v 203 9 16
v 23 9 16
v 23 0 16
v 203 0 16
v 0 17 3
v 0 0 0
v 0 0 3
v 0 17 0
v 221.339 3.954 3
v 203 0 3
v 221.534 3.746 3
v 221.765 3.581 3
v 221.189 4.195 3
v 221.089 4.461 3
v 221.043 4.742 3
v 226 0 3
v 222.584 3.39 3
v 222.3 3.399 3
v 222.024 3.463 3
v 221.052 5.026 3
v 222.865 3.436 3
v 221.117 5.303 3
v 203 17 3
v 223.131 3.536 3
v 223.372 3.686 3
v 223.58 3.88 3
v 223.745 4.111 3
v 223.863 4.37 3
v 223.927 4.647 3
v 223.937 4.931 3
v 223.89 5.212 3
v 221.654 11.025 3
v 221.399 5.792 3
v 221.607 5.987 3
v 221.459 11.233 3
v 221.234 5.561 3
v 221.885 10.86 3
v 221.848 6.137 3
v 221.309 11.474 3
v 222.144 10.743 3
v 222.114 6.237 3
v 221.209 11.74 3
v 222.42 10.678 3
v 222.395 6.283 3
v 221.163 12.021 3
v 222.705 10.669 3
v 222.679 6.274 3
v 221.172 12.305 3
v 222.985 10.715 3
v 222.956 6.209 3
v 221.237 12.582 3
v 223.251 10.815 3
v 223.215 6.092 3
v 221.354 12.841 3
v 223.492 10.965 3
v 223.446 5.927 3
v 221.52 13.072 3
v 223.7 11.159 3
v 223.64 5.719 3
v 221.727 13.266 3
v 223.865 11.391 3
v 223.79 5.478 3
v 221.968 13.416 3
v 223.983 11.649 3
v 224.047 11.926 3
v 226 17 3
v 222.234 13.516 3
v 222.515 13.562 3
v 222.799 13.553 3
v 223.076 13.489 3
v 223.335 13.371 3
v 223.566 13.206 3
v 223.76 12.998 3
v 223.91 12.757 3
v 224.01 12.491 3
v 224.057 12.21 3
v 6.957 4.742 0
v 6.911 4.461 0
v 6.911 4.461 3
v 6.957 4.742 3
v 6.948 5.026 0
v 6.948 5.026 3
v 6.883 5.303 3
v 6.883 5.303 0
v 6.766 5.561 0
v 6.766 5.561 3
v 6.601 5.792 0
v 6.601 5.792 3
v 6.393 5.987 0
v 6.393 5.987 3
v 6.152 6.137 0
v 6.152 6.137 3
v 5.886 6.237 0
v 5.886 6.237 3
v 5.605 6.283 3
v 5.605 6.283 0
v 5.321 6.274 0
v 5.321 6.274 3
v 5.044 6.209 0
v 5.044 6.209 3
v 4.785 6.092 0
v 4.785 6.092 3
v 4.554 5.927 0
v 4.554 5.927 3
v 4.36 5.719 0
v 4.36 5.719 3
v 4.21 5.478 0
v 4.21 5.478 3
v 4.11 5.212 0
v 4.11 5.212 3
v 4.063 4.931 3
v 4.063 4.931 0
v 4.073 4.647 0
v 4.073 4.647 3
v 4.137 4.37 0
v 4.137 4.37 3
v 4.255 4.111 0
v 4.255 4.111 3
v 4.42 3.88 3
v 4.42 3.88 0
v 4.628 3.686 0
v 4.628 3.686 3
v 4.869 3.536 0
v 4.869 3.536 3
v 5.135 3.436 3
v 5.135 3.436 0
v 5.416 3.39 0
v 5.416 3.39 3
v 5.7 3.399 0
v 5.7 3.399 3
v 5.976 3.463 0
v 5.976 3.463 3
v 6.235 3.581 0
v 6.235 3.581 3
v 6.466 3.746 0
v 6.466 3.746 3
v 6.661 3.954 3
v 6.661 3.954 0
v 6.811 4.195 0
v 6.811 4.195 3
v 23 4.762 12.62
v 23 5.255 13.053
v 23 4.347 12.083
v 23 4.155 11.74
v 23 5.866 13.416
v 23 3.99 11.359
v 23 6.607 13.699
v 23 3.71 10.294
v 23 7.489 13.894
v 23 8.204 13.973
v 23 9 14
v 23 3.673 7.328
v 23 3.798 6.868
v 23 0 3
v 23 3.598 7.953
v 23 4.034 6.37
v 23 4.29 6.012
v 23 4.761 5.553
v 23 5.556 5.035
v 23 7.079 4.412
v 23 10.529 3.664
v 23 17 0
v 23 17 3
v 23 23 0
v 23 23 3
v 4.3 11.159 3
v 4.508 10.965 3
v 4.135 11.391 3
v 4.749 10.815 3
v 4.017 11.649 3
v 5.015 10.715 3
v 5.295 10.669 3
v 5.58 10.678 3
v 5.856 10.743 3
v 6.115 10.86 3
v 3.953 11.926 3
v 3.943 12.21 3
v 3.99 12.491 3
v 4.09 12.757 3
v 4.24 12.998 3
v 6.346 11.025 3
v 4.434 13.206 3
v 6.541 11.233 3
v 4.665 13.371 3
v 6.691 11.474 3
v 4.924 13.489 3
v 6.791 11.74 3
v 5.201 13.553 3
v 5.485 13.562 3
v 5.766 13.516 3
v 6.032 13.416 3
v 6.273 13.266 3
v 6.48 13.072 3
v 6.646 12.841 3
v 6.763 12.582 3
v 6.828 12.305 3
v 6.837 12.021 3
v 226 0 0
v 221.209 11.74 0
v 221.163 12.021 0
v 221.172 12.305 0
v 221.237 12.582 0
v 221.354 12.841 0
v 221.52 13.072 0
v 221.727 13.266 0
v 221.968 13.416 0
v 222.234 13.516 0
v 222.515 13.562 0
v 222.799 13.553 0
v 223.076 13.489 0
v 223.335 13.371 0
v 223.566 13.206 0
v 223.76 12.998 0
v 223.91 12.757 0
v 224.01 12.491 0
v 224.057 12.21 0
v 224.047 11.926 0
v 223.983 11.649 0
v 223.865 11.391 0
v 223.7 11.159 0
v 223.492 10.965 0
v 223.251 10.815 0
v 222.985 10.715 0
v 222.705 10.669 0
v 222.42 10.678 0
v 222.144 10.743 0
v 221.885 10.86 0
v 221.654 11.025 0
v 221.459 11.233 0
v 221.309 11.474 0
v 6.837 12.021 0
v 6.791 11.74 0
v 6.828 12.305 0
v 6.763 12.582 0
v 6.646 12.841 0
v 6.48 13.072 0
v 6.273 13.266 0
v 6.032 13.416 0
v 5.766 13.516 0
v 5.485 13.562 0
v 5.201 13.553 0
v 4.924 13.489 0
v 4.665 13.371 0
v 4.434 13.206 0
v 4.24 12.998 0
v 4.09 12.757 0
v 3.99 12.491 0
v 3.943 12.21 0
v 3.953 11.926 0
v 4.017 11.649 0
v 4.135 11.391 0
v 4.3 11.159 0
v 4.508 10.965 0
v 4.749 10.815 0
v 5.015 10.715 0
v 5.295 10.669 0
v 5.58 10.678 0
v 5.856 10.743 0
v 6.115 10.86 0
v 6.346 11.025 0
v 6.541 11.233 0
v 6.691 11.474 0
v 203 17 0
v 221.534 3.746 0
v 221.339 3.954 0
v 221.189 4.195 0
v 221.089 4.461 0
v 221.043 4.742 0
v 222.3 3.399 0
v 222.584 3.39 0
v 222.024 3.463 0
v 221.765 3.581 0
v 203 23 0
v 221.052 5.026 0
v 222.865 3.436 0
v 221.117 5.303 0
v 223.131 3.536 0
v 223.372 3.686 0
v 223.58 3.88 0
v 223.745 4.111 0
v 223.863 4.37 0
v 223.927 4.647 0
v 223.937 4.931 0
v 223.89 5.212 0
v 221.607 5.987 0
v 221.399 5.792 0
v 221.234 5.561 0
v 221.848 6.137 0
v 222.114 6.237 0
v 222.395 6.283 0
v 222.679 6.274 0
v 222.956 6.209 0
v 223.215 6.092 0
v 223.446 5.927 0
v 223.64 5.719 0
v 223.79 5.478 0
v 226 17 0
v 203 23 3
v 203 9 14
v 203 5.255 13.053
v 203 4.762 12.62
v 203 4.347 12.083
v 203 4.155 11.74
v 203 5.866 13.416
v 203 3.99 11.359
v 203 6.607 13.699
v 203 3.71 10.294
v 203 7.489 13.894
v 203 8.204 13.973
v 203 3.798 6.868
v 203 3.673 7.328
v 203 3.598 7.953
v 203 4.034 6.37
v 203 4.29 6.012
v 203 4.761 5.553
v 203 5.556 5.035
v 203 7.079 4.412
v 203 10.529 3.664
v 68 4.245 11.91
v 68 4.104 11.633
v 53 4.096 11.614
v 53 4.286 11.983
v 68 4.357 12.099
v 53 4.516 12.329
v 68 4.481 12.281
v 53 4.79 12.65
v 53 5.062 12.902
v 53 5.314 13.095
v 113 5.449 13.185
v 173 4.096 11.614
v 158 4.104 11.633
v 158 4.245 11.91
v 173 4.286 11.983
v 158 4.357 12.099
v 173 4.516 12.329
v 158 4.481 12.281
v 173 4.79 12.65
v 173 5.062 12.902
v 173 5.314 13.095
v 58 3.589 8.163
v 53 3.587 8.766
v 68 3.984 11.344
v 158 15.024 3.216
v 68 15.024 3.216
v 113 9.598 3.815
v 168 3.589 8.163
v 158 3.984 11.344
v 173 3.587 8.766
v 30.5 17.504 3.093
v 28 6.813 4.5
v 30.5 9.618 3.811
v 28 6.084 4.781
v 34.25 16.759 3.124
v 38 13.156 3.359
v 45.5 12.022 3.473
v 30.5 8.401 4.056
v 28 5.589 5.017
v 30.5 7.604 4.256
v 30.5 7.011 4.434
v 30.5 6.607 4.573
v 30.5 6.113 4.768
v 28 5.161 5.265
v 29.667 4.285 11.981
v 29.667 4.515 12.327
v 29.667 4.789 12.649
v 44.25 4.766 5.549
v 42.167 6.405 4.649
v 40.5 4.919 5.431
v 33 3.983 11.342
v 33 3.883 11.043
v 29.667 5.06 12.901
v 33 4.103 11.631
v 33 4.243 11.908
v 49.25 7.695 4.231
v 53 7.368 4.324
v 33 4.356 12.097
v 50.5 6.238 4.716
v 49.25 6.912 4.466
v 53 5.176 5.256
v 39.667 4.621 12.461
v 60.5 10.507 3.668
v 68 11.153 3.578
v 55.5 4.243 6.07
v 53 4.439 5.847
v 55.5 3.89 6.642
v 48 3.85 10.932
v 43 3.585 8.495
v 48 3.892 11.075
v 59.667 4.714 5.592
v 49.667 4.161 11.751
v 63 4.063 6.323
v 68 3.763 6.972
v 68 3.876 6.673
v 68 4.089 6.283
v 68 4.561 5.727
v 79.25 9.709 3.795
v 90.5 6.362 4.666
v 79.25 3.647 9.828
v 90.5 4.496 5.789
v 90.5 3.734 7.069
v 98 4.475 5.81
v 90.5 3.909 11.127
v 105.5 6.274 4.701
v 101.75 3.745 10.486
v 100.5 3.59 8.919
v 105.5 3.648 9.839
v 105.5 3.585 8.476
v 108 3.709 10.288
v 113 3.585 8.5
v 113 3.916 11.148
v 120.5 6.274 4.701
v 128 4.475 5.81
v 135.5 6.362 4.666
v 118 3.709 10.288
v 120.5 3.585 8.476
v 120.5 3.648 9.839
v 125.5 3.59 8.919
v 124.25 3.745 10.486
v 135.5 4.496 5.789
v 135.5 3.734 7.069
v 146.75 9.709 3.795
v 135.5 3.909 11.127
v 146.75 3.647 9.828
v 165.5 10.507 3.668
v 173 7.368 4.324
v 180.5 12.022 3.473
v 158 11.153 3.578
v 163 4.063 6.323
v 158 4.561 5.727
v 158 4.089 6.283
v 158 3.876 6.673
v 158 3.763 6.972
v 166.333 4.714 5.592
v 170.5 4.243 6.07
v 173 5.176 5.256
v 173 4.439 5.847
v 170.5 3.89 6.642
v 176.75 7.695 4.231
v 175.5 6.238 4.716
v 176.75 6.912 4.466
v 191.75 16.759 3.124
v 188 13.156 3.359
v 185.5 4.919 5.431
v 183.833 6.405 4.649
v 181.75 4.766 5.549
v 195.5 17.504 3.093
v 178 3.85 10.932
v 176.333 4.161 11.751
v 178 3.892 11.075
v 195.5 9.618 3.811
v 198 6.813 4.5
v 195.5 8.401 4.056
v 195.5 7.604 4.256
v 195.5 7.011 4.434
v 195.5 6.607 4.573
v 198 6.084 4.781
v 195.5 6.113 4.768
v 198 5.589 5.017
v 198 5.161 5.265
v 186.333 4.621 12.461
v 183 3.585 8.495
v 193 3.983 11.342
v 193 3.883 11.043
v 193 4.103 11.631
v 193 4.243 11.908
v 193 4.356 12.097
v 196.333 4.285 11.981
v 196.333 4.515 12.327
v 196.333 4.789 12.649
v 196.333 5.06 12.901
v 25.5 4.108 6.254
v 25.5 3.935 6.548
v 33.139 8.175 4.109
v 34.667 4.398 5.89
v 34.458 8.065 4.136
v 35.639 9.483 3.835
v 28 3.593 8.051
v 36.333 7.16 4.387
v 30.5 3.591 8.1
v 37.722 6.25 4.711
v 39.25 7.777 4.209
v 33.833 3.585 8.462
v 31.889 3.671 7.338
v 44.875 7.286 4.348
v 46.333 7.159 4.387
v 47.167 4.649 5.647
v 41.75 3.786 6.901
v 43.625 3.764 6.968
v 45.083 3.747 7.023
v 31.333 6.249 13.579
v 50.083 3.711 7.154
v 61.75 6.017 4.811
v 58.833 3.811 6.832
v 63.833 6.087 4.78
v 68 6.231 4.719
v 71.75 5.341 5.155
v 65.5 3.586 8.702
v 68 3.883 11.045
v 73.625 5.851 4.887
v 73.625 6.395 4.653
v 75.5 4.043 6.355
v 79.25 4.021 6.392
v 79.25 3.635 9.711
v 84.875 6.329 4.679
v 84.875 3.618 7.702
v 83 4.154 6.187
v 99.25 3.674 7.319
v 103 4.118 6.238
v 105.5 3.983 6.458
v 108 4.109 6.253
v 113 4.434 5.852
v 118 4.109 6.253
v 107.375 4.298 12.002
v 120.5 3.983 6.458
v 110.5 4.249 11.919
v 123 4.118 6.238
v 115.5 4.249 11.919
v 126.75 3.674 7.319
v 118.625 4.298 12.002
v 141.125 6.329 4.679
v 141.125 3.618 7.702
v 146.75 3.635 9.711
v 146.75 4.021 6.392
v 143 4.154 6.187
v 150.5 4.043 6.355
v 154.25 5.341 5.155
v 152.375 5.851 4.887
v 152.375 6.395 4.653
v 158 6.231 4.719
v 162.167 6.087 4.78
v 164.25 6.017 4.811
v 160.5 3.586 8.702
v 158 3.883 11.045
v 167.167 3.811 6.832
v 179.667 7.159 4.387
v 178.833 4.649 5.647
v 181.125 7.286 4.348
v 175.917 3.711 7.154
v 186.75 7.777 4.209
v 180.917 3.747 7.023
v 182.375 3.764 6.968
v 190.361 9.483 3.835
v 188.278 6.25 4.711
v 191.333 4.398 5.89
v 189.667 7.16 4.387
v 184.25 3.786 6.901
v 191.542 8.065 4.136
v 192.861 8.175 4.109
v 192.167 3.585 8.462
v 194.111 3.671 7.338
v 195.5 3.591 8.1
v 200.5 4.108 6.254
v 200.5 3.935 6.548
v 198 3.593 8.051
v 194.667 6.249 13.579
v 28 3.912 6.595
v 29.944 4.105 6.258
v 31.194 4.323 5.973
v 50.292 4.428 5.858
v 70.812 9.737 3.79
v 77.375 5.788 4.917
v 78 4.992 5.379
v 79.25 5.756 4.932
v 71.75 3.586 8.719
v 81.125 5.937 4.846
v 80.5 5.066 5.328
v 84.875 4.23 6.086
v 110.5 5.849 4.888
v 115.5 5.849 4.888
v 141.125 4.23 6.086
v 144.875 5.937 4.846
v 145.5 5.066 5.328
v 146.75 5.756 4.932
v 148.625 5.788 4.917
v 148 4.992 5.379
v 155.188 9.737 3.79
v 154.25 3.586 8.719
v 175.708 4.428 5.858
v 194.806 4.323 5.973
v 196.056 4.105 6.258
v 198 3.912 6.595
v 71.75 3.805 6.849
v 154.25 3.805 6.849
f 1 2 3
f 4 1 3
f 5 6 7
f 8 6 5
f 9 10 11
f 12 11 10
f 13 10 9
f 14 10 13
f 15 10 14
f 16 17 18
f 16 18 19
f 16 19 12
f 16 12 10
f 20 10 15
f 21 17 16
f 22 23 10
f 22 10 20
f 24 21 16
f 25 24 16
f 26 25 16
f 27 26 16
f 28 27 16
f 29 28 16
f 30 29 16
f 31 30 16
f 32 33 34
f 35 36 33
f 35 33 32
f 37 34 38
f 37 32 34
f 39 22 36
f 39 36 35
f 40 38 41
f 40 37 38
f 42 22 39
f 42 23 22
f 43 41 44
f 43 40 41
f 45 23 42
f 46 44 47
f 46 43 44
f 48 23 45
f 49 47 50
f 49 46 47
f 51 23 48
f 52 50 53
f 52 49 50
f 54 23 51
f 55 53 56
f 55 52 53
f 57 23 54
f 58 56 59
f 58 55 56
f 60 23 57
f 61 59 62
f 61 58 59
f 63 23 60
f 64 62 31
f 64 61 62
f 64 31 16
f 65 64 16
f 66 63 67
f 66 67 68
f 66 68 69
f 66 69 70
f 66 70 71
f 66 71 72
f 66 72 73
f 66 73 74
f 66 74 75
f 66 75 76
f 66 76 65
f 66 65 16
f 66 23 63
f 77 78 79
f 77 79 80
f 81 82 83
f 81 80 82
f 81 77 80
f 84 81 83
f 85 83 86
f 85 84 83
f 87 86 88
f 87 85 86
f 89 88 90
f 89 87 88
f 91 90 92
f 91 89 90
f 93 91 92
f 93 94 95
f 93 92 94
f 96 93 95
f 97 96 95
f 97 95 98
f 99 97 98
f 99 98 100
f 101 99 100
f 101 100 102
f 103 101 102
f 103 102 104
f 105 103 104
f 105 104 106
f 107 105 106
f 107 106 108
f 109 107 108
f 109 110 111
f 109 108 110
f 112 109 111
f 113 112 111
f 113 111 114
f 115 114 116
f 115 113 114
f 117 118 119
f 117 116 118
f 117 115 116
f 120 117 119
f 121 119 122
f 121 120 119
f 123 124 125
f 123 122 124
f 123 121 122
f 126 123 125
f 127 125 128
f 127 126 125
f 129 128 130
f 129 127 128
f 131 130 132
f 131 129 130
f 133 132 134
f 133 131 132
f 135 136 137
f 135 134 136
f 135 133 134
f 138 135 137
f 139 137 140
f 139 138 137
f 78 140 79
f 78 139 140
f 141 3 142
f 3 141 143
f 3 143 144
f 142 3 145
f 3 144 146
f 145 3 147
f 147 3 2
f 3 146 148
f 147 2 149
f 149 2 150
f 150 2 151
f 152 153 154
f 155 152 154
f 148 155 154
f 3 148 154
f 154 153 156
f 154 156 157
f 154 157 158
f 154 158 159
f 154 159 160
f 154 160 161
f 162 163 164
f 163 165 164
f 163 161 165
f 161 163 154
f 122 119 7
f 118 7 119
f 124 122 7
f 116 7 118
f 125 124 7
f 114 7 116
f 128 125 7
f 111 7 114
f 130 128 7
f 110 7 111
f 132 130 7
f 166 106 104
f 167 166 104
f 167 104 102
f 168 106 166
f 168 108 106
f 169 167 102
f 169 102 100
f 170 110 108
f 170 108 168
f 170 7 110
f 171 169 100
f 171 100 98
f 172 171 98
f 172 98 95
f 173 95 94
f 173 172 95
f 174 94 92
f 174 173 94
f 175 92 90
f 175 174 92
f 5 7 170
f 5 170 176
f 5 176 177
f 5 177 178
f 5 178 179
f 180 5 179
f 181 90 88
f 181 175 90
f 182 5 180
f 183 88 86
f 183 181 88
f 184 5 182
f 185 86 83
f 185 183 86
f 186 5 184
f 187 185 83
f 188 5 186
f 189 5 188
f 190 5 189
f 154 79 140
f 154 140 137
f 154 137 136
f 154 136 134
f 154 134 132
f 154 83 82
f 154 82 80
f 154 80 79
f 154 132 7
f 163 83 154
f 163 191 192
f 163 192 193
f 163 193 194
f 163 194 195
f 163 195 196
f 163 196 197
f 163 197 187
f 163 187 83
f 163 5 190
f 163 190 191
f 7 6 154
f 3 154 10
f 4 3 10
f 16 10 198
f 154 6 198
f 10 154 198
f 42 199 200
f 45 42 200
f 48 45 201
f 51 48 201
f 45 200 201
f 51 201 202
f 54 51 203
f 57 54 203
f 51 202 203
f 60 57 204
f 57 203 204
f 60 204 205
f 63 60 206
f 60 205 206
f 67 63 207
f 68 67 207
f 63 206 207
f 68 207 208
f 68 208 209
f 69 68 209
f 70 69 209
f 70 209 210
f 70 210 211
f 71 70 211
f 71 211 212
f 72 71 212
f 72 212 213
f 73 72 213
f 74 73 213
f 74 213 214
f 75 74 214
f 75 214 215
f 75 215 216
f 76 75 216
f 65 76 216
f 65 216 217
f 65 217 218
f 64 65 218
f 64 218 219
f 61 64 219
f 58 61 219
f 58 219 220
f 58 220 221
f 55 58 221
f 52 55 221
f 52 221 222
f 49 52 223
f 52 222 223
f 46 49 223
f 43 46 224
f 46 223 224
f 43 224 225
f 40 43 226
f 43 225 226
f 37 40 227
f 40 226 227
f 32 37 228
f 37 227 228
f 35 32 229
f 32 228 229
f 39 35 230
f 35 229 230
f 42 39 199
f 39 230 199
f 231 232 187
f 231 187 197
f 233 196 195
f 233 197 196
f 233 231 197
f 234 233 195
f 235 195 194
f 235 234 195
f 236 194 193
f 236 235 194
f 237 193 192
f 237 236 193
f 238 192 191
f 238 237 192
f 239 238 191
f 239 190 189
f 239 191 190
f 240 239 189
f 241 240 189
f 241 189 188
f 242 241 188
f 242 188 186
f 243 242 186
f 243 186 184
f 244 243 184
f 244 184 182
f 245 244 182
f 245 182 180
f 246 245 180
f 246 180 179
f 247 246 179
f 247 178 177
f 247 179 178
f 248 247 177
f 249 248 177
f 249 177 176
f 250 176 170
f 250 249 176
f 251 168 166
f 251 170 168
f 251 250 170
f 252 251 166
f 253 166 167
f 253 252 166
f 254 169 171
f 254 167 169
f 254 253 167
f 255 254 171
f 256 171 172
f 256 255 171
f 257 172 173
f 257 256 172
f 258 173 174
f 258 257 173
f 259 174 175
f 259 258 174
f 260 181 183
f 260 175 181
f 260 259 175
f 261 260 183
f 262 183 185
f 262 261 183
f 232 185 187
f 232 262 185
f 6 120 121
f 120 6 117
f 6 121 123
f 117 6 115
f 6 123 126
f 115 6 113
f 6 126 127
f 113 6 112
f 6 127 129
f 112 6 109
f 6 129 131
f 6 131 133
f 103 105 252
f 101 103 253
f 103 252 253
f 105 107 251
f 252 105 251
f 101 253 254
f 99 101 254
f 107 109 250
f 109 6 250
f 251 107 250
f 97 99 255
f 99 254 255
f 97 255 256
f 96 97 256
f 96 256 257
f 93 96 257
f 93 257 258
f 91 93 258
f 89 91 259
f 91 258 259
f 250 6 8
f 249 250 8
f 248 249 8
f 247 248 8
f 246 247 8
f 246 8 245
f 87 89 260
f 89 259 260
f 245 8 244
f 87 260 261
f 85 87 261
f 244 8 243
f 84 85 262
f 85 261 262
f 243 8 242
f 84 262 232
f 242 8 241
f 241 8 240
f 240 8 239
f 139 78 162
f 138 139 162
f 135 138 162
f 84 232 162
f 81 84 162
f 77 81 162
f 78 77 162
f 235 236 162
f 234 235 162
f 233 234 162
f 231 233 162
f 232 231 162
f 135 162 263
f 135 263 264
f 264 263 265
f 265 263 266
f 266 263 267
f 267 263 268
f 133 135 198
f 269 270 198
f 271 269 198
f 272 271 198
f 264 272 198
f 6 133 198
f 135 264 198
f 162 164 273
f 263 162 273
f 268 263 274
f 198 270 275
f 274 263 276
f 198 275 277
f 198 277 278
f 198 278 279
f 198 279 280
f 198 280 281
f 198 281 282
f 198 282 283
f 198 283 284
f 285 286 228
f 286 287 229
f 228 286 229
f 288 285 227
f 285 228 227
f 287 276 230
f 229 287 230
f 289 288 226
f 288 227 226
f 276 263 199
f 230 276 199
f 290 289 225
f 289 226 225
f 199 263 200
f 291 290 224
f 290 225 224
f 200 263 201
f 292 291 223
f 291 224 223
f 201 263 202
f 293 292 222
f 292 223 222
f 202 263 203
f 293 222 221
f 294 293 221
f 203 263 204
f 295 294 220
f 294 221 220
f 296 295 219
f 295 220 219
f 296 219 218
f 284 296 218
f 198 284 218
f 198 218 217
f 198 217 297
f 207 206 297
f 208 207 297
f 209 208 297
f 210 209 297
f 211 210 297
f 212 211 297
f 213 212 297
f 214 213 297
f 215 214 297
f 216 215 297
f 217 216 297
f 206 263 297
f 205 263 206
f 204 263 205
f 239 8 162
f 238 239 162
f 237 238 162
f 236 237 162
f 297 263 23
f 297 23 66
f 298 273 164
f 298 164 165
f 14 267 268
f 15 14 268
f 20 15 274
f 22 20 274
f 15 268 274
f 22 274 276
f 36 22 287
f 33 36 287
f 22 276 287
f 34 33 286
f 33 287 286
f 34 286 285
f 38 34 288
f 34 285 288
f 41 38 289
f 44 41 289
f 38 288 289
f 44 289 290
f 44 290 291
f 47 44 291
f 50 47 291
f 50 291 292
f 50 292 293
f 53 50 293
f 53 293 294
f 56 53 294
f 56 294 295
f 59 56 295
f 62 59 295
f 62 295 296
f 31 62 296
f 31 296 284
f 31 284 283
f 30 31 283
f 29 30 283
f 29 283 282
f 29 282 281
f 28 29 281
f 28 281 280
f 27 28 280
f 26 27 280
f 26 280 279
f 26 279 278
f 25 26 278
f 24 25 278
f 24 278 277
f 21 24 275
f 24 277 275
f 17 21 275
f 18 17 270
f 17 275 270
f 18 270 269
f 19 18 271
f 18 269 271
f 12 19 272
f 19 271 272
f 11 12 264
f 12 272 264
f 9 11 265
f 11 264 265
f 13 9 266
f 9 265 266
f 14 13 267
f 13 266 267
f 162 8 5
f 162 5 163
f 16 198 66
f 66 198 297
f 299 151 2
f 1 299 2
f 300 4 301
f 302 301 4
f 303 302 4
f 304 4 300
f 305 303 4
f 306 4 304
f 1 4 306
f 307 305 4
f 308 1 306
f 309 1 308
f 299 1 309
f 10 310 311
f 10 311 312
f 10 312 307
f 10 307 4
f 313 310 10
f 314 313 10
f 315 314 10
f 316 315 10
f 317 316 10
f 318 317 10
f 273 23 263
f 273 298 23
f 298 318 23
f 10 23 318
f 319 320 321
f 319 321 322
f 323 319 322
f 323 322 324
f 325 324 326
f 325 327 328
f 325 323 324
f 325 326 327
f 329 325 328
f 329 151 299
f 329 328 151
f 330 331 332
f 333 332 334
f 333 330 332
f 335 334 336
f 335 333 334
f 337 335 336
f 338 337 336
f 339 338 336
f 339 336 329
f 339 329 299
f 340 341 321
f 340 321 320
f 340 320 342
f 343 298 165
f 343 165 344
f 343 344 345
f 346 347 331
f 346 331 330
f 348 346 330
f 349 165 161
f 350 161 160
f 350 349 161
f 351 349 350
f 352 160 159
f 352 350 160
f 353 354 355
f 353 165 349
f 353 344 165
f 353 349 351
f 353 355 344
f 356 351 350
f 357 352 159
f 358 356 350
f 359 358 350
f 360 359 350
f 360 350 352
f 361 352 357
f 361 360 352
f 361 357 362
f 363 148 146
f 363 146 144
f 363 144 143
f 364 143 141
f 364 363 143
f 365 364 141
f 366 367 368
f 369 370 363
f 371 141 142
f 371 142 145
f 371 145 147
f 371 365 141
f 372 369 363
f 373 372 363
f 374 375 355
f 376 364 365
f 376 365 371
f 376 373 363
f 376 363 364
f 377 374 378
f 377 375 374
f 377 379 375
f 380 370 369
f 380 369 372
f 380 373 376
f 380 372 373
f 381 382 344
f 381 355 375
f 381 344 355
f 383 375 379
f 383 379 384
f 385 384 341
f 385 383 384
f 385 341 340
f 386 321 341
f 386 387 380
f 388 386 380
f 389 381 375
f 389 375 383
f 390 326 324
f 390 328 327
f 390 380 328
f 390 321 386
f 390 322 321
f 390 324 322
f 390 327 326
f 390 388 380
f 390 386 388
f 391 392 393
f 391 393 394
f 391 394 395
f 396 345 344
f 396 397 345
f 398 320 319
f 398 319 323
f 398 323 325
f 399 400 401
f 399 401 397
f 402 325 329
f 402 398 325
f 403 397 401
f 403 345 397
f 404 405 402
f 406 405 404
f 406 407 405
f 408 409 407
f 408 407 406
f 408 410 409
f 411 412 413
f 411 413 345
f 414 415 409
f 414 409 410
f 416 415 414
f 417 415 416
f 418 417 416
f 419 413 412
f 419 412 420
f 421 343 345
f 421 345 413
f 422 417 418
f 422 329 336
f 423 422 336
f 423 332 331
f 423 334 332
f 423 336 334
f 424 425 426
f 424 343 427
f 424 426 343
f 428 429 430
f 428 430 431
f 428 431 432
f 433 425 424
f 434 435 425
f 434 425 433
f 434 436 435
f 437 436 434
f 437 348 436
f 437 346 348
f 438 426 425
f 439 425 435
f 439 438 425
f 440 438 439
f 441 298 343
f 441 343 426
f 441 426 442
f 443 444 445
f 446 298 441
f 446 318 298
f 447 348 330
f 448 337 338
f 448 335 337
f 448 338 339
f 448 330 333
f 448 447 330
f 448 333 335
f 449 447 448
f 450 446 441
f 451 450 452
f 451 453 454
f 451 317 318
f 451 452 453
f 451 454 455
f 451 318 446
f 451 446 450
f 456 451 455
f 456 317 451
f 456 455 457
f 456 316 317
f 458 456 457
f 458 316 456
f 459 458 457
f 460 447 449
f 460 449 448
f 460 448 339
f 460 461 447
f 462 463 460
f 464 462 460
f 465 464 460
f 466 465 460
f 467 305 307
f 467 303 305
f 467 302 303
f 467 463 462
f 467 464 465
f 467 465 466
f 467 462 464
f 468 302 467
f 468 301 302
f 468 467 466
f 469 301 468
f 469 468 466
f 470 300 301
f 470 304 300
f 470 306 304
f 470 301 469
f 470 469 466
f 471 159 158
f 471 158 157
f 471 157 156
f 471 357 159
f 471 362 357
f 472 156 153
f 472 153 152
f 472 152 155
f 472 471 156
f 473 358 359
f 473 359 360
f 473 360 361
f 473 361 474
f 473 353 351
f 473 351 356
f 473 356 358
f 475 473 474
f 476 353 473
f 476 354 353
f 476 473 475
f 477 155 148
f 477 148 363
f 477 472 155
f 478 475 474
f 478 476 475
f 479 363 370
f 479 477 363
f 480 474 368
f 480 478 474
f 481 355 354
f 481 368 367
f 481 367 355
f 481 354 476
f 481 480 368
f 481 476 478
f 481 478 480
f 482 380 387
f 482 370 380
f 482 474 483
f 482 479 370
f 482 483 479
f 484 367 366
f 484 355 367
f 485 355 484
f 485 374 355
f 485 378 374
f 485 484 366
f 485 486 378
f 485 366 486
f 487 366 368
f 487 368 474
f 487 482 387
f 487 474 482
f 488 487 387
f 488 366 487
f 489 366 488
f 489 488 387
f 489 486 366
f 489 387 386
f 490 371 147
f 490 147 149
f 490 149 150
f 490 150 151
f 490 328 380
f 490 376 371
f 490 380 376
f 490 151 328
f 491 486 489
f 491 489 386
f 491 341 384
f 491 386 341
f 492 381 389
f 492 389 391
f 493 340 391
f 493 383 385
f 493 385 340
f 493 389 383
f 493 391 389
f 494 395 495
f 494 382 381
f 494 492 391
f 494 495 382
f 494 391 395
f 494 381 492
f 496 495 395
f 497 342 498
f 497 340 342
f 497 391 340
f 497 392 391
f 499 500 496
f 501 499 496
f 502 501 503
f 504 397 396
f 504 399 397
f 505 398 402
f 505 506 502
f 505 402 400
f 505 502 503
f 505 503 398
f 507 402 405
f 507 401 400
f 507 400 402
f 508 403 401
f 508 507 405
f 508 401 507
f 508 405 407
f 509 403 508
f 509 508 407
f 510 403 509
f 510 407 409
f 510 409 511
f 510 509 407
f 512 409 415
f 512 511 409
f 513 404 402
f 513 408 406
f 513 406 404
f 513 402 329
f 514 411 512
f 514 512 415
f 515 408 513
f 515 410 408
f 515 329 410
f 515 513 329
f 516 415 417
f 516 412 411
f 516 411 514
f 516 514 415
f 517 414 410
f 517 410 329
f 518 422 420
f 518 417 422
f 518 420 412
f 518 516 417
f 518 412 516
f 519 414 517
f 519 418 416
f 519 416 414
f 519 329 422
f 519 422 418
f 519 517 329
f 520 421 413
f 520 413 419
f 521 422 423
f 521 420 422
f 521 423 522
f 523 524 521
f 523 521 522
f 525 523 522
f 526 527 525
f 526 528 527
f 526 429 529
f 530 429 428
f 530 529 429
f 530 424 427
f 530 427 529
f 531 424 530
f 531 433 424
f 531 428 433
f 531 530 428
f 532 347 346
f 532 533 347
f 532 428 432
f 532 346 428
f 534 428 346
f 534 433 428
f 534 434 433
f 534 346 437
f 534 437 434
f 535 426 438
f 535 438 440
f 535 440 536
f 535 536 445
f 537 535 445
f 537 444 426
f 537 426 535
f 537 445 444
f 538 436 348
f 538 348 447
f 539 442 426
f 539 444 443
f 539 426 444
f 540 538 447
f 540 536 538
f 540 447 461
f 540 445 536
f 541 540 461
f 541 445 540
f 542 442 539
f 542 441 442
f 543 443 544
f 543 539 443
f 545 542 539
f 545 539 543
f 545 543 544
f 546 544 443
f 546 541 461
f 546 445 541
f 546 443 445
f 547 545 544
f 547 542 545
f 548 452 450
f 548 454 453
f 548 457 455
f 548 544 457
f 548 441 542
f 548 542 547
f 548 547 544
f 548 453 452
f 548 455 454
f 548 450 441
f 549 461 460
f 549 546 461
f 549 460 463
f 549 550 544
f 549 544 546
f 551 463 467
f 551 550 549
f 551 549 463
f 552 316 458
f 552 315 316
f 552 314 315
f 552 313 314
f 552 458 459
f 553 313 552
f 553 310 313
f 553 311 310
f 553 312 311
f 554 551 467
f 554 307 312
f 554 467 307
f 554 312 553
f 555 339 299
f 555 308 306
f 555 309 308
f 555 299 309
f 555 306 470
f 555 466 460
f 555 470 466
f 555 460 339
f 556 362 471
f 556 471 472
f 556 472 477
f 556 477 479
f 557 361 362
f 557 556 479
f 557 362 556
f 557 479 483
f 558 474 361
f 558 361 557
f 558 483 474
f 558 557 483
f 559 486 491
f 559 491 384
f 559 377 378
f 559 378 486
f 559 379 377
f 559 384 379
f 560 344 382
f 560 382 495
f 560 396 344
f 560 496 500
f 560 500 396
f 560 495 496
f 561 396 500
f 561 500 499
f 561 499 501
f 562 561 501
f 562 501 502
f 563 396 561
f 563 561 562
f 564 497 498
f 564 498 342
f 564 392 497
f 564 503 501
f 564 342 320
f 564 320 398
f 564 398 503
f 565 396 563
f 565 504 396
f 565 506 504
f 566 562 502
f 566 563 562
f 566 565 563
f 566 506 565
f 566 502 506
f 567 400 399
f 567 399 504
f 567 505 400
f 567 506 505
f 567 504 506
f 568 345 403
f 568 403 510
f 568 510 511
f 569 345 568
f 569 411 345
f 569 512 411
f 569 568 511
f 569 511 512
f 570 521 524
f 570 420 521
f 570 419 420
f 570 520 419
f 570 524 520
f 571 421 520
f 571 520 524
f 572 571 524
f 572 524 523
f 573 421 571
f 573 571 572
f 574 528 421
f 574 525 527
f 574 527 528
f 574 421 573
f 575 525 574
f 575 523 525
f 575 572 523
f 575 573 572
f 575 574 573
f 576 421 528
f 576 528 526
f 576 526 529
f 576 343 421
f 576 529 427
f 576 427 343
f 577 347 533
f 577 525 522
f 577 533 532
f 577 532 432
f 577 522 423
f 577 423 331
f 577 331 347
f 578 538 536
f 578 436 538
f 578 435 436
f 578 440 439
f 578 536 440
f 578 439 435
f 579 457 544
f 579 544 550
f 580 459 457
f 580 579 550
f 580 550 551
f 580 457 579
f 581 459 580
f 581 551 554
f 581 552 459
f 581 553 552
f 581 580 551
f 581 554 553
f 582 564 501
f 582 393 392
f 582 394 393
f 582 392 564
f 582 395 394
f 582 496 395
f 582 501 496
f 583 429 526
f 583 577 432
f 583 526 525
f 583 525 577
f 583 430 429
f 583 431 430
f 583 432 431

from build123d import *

# Parameters (mm, degrees)
CYLINDER006_R           = 1.45
CYLINDER006_DEPTH       = 50
CYLINDER007_R           = 1.45
CYLINDER007_DEPTH       = 50
BODY007_PLACEMENT_ANGLE = 15
BOX_W                   = 226
BOX_H                   = 17
BOX_DEPTH               = 3
PAD005_DEPTH            = 180
BODY011_PITCH_ANGLE     = -90
BODY011_PLACEMENT_ANGLE = -90


with BuildPart() as cylinder004:
    # Cylinder006 → Cylinder006 (new body)
    with BuildSketch(Plane(origin=(23, 5, -5), x_dir=(1, 0, 0), z_dir=(0, 0, 1))):
        Circle(CYLINDER006_R)
    extrude(amount=CYLINDER006_DEPTH)


with BuildPart() as round_holes_clone:
    # Cylinder007 → Cylinder007 (new body)
    with BuildSketch(Plane(origin=(21, 12, -5), x_dir=(1, 0, 0), z_dir=(0, 0, 1))):
        Circle(CYLINDER007_R)
    extrude(amount=CYLINDER007_DEPTH)

    # Fusion: union Cylinder004
    add(cylinder004.part)


with BuildPart() as round_holes_clone_1:
    # Body007 placement: moved
    add(round_holes_clone.part.moved(Location((0, 5.95964, -31))).rotate(Axis((0, 5.95964, -31), (0, 0, -1)), BODY007_PLACEMENT_ANGLE))


with BuildPart() as fusion003:
    # Part__Mirroring001: instance of round holes clone
    add(round_holes_clone_1.part.mirror(Plane(origin=(132, 0, 0), x_dir=(0, -1, 0), z_dir=(1, 0, 0))))

    # Fusion003: union round holes clone
    add(round_holes_clone_1.part)


with BuildPart() as fusion003_1:
    # Fusion003 placement: moved
    add(fusion003.part.moved(Location((-18, 0, 0))))


with BuildPart() as body009:
    # Box → Box (new body)
    with BuildSketch(Plane.XY):
        with Locations((113, 8.5)):
            Rectangle(BOX_W, BOX_H)
    extrude(amount=BOX_DEPTH)

    # Cut003: cut Fusion003
    add(fusion003_1.part, mode=Mode.SUBTRACT)


with BuildPart() as fusion004:
    # Sketch005 → Pad005 (new body)
    with BuildSketch(Plane.XZ):
        with BuildLine():
            Line((-8.5, -3), (-8.5, 20))
            Line((-8.5, 20), (-5.5, 20))
            add(Edge.make_bspline(
                [(-5.5, 20), (-5.5, 1.17), (0, 0), (5.5, 1.17), (5.5, 6)],
                knots=[0, 0, 0, 0, 0.5, 1, 1, 1, 1], degree=3))
            Line((5.5, 6), (7.5, 6))
            Line((7.5, 6), (7.5, -3))
            Line((7.5, -3), (-8.5, -3))
        make_face()
    extrude(amount=PAD005_DEPTH)


with BuildPart() as fusion004_1:
    # Body011 pitch: moved
    add(fusion004.part.rotate(Axis((0, 0, 0), (0, 1, 0)), BODY011_PITCH_ANGLE))


with BuildPart() as fusion004_2:
    # Body011 placement: moved
    add(fusion004_1.part.moved(Location((203, 3, 8.5))).rotate(Axis((203, 3, 8.5), (0, 0, 1)), BODY011_PLACEMENT_ANGLE))

    # Fusion004: union Body009
    add(body009.part)


solid = fusion004_2.part
